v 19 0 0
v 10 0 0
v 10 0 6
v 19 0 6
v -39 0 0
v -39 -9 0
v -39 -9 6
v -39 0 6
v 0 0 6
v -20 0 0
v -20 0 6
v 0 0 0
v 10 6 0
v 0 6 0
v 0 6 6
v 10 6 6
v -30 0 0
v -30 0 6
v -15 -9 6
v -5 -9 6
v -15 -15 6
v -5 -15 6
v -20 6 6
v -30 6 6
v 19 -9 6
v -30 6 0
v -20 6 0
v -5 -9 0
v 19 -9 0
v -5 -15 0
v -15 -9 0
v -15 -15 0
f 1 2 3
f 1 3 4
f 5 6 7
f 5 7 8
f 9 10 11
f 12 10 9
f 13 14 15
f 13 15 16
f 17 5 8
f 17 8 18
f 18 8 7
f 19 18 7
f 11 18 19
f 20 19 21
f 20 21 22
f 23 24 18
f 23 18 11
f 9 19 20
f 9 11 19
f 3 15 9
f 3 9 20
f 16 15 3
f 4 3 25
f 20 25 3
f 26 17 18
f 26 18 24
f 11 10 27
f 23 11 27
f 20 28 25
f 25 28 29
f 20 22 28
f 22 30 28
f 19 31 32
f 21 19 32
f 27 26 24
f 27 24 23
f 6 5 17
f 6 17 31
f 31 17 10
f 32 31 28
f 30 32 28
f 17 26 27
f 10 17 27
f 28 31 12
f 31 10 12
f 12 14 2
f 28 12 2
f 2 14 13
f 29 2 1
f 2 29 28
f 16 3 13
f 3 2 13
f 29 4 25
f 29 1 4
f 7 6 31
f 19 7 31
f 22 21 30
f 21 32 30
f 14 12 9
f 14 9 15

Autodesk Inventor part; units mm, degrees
ref_plane "YZ Plane" through (0, 0, 0) normal (1, 0, 0) x (0, 1, 0)
ref_plane "XZ Plane" through (0, 0, 0) normal (0, 1, 0) x (-1, 0, 0)
ref_plane "XY Plane" through (0, 0, 0) normal (0, 0, 1) x (1, 0, 0)
ref_plane "Work Plane1" through (-30, 0, 0) normal (0, 0, 1) x (1, 0, 0)
sketch "Sketch1" plane through (-30, 0, 0) normal (0, 0, 1) x (1, 0, 0)
  line L0 (0, 6) -> (10, 6)
  line L1 (0, 0) -> (0, 6)
  line L2 (10, 0) -> (0, 0)
  line L3 (10, 0) -> (10, 6)
  line L4 (30, 6) -> (40, 6)
  line L5 (30, 0) -> (30, 6)
  line L6 (40, 0) -> (30, 0)
  line L7 (40, 0) -> (40, 6)
  line L8 (49, 0) -> (49, -9)
  line L9 (-9, -9) -> (-9, 0)
  line L10 (-15, 0) -> (0, 0)
  line L11 (10, 0) -> (30, 0)
  line L12 (40, 0) -> (55, 0)
  line L13 (121.5157, 6) -> (-97.4843, 6)
  line L14 (-97.4843, -9) -> (121.5157, -9)
  line L15 (25, -9) -> (15, -9)
  line L16 (15, -9) -> (15, -15)
  line L17 (15, -15) -> (25, -15)
  line L18 (25, -15) -> (25, -9)
  point P0 (20, -15)
  point P1 (20, 0)
  dimension "d0" = 10
  dimension "d1" = 6
extrude "Plate1" add sketch "Sketch1" along normal blind 6 contours L0 L3 L2 L1 | L2 L11 L6 L12 L8 L14 L9 L10 | L4 L7 L6 L5 | L14 L18 L17 L16
equation "\"d2\" = Thickness"
equation "\"BendRadius\" = Thickness"
equation "\"BendReliefWidth\" = Thickness"
equation "\"BendReliefDepth\" = 0.5 * Thickness"
equation "\"CornerReliefSize\" = 4 * Thickness"
equation "\"MinimumRemnant\" = 2 * Thickness"
equation "\"TransitionRadius\" = BendRadius"
equation "\"JacobiRadiusSize\" = BendRadius"
equation "\"GapSize\" = Thickness"
equation "\"Thickness\" = 6"
properties part number "joystick buiskant" material "Wood (Birch)"
